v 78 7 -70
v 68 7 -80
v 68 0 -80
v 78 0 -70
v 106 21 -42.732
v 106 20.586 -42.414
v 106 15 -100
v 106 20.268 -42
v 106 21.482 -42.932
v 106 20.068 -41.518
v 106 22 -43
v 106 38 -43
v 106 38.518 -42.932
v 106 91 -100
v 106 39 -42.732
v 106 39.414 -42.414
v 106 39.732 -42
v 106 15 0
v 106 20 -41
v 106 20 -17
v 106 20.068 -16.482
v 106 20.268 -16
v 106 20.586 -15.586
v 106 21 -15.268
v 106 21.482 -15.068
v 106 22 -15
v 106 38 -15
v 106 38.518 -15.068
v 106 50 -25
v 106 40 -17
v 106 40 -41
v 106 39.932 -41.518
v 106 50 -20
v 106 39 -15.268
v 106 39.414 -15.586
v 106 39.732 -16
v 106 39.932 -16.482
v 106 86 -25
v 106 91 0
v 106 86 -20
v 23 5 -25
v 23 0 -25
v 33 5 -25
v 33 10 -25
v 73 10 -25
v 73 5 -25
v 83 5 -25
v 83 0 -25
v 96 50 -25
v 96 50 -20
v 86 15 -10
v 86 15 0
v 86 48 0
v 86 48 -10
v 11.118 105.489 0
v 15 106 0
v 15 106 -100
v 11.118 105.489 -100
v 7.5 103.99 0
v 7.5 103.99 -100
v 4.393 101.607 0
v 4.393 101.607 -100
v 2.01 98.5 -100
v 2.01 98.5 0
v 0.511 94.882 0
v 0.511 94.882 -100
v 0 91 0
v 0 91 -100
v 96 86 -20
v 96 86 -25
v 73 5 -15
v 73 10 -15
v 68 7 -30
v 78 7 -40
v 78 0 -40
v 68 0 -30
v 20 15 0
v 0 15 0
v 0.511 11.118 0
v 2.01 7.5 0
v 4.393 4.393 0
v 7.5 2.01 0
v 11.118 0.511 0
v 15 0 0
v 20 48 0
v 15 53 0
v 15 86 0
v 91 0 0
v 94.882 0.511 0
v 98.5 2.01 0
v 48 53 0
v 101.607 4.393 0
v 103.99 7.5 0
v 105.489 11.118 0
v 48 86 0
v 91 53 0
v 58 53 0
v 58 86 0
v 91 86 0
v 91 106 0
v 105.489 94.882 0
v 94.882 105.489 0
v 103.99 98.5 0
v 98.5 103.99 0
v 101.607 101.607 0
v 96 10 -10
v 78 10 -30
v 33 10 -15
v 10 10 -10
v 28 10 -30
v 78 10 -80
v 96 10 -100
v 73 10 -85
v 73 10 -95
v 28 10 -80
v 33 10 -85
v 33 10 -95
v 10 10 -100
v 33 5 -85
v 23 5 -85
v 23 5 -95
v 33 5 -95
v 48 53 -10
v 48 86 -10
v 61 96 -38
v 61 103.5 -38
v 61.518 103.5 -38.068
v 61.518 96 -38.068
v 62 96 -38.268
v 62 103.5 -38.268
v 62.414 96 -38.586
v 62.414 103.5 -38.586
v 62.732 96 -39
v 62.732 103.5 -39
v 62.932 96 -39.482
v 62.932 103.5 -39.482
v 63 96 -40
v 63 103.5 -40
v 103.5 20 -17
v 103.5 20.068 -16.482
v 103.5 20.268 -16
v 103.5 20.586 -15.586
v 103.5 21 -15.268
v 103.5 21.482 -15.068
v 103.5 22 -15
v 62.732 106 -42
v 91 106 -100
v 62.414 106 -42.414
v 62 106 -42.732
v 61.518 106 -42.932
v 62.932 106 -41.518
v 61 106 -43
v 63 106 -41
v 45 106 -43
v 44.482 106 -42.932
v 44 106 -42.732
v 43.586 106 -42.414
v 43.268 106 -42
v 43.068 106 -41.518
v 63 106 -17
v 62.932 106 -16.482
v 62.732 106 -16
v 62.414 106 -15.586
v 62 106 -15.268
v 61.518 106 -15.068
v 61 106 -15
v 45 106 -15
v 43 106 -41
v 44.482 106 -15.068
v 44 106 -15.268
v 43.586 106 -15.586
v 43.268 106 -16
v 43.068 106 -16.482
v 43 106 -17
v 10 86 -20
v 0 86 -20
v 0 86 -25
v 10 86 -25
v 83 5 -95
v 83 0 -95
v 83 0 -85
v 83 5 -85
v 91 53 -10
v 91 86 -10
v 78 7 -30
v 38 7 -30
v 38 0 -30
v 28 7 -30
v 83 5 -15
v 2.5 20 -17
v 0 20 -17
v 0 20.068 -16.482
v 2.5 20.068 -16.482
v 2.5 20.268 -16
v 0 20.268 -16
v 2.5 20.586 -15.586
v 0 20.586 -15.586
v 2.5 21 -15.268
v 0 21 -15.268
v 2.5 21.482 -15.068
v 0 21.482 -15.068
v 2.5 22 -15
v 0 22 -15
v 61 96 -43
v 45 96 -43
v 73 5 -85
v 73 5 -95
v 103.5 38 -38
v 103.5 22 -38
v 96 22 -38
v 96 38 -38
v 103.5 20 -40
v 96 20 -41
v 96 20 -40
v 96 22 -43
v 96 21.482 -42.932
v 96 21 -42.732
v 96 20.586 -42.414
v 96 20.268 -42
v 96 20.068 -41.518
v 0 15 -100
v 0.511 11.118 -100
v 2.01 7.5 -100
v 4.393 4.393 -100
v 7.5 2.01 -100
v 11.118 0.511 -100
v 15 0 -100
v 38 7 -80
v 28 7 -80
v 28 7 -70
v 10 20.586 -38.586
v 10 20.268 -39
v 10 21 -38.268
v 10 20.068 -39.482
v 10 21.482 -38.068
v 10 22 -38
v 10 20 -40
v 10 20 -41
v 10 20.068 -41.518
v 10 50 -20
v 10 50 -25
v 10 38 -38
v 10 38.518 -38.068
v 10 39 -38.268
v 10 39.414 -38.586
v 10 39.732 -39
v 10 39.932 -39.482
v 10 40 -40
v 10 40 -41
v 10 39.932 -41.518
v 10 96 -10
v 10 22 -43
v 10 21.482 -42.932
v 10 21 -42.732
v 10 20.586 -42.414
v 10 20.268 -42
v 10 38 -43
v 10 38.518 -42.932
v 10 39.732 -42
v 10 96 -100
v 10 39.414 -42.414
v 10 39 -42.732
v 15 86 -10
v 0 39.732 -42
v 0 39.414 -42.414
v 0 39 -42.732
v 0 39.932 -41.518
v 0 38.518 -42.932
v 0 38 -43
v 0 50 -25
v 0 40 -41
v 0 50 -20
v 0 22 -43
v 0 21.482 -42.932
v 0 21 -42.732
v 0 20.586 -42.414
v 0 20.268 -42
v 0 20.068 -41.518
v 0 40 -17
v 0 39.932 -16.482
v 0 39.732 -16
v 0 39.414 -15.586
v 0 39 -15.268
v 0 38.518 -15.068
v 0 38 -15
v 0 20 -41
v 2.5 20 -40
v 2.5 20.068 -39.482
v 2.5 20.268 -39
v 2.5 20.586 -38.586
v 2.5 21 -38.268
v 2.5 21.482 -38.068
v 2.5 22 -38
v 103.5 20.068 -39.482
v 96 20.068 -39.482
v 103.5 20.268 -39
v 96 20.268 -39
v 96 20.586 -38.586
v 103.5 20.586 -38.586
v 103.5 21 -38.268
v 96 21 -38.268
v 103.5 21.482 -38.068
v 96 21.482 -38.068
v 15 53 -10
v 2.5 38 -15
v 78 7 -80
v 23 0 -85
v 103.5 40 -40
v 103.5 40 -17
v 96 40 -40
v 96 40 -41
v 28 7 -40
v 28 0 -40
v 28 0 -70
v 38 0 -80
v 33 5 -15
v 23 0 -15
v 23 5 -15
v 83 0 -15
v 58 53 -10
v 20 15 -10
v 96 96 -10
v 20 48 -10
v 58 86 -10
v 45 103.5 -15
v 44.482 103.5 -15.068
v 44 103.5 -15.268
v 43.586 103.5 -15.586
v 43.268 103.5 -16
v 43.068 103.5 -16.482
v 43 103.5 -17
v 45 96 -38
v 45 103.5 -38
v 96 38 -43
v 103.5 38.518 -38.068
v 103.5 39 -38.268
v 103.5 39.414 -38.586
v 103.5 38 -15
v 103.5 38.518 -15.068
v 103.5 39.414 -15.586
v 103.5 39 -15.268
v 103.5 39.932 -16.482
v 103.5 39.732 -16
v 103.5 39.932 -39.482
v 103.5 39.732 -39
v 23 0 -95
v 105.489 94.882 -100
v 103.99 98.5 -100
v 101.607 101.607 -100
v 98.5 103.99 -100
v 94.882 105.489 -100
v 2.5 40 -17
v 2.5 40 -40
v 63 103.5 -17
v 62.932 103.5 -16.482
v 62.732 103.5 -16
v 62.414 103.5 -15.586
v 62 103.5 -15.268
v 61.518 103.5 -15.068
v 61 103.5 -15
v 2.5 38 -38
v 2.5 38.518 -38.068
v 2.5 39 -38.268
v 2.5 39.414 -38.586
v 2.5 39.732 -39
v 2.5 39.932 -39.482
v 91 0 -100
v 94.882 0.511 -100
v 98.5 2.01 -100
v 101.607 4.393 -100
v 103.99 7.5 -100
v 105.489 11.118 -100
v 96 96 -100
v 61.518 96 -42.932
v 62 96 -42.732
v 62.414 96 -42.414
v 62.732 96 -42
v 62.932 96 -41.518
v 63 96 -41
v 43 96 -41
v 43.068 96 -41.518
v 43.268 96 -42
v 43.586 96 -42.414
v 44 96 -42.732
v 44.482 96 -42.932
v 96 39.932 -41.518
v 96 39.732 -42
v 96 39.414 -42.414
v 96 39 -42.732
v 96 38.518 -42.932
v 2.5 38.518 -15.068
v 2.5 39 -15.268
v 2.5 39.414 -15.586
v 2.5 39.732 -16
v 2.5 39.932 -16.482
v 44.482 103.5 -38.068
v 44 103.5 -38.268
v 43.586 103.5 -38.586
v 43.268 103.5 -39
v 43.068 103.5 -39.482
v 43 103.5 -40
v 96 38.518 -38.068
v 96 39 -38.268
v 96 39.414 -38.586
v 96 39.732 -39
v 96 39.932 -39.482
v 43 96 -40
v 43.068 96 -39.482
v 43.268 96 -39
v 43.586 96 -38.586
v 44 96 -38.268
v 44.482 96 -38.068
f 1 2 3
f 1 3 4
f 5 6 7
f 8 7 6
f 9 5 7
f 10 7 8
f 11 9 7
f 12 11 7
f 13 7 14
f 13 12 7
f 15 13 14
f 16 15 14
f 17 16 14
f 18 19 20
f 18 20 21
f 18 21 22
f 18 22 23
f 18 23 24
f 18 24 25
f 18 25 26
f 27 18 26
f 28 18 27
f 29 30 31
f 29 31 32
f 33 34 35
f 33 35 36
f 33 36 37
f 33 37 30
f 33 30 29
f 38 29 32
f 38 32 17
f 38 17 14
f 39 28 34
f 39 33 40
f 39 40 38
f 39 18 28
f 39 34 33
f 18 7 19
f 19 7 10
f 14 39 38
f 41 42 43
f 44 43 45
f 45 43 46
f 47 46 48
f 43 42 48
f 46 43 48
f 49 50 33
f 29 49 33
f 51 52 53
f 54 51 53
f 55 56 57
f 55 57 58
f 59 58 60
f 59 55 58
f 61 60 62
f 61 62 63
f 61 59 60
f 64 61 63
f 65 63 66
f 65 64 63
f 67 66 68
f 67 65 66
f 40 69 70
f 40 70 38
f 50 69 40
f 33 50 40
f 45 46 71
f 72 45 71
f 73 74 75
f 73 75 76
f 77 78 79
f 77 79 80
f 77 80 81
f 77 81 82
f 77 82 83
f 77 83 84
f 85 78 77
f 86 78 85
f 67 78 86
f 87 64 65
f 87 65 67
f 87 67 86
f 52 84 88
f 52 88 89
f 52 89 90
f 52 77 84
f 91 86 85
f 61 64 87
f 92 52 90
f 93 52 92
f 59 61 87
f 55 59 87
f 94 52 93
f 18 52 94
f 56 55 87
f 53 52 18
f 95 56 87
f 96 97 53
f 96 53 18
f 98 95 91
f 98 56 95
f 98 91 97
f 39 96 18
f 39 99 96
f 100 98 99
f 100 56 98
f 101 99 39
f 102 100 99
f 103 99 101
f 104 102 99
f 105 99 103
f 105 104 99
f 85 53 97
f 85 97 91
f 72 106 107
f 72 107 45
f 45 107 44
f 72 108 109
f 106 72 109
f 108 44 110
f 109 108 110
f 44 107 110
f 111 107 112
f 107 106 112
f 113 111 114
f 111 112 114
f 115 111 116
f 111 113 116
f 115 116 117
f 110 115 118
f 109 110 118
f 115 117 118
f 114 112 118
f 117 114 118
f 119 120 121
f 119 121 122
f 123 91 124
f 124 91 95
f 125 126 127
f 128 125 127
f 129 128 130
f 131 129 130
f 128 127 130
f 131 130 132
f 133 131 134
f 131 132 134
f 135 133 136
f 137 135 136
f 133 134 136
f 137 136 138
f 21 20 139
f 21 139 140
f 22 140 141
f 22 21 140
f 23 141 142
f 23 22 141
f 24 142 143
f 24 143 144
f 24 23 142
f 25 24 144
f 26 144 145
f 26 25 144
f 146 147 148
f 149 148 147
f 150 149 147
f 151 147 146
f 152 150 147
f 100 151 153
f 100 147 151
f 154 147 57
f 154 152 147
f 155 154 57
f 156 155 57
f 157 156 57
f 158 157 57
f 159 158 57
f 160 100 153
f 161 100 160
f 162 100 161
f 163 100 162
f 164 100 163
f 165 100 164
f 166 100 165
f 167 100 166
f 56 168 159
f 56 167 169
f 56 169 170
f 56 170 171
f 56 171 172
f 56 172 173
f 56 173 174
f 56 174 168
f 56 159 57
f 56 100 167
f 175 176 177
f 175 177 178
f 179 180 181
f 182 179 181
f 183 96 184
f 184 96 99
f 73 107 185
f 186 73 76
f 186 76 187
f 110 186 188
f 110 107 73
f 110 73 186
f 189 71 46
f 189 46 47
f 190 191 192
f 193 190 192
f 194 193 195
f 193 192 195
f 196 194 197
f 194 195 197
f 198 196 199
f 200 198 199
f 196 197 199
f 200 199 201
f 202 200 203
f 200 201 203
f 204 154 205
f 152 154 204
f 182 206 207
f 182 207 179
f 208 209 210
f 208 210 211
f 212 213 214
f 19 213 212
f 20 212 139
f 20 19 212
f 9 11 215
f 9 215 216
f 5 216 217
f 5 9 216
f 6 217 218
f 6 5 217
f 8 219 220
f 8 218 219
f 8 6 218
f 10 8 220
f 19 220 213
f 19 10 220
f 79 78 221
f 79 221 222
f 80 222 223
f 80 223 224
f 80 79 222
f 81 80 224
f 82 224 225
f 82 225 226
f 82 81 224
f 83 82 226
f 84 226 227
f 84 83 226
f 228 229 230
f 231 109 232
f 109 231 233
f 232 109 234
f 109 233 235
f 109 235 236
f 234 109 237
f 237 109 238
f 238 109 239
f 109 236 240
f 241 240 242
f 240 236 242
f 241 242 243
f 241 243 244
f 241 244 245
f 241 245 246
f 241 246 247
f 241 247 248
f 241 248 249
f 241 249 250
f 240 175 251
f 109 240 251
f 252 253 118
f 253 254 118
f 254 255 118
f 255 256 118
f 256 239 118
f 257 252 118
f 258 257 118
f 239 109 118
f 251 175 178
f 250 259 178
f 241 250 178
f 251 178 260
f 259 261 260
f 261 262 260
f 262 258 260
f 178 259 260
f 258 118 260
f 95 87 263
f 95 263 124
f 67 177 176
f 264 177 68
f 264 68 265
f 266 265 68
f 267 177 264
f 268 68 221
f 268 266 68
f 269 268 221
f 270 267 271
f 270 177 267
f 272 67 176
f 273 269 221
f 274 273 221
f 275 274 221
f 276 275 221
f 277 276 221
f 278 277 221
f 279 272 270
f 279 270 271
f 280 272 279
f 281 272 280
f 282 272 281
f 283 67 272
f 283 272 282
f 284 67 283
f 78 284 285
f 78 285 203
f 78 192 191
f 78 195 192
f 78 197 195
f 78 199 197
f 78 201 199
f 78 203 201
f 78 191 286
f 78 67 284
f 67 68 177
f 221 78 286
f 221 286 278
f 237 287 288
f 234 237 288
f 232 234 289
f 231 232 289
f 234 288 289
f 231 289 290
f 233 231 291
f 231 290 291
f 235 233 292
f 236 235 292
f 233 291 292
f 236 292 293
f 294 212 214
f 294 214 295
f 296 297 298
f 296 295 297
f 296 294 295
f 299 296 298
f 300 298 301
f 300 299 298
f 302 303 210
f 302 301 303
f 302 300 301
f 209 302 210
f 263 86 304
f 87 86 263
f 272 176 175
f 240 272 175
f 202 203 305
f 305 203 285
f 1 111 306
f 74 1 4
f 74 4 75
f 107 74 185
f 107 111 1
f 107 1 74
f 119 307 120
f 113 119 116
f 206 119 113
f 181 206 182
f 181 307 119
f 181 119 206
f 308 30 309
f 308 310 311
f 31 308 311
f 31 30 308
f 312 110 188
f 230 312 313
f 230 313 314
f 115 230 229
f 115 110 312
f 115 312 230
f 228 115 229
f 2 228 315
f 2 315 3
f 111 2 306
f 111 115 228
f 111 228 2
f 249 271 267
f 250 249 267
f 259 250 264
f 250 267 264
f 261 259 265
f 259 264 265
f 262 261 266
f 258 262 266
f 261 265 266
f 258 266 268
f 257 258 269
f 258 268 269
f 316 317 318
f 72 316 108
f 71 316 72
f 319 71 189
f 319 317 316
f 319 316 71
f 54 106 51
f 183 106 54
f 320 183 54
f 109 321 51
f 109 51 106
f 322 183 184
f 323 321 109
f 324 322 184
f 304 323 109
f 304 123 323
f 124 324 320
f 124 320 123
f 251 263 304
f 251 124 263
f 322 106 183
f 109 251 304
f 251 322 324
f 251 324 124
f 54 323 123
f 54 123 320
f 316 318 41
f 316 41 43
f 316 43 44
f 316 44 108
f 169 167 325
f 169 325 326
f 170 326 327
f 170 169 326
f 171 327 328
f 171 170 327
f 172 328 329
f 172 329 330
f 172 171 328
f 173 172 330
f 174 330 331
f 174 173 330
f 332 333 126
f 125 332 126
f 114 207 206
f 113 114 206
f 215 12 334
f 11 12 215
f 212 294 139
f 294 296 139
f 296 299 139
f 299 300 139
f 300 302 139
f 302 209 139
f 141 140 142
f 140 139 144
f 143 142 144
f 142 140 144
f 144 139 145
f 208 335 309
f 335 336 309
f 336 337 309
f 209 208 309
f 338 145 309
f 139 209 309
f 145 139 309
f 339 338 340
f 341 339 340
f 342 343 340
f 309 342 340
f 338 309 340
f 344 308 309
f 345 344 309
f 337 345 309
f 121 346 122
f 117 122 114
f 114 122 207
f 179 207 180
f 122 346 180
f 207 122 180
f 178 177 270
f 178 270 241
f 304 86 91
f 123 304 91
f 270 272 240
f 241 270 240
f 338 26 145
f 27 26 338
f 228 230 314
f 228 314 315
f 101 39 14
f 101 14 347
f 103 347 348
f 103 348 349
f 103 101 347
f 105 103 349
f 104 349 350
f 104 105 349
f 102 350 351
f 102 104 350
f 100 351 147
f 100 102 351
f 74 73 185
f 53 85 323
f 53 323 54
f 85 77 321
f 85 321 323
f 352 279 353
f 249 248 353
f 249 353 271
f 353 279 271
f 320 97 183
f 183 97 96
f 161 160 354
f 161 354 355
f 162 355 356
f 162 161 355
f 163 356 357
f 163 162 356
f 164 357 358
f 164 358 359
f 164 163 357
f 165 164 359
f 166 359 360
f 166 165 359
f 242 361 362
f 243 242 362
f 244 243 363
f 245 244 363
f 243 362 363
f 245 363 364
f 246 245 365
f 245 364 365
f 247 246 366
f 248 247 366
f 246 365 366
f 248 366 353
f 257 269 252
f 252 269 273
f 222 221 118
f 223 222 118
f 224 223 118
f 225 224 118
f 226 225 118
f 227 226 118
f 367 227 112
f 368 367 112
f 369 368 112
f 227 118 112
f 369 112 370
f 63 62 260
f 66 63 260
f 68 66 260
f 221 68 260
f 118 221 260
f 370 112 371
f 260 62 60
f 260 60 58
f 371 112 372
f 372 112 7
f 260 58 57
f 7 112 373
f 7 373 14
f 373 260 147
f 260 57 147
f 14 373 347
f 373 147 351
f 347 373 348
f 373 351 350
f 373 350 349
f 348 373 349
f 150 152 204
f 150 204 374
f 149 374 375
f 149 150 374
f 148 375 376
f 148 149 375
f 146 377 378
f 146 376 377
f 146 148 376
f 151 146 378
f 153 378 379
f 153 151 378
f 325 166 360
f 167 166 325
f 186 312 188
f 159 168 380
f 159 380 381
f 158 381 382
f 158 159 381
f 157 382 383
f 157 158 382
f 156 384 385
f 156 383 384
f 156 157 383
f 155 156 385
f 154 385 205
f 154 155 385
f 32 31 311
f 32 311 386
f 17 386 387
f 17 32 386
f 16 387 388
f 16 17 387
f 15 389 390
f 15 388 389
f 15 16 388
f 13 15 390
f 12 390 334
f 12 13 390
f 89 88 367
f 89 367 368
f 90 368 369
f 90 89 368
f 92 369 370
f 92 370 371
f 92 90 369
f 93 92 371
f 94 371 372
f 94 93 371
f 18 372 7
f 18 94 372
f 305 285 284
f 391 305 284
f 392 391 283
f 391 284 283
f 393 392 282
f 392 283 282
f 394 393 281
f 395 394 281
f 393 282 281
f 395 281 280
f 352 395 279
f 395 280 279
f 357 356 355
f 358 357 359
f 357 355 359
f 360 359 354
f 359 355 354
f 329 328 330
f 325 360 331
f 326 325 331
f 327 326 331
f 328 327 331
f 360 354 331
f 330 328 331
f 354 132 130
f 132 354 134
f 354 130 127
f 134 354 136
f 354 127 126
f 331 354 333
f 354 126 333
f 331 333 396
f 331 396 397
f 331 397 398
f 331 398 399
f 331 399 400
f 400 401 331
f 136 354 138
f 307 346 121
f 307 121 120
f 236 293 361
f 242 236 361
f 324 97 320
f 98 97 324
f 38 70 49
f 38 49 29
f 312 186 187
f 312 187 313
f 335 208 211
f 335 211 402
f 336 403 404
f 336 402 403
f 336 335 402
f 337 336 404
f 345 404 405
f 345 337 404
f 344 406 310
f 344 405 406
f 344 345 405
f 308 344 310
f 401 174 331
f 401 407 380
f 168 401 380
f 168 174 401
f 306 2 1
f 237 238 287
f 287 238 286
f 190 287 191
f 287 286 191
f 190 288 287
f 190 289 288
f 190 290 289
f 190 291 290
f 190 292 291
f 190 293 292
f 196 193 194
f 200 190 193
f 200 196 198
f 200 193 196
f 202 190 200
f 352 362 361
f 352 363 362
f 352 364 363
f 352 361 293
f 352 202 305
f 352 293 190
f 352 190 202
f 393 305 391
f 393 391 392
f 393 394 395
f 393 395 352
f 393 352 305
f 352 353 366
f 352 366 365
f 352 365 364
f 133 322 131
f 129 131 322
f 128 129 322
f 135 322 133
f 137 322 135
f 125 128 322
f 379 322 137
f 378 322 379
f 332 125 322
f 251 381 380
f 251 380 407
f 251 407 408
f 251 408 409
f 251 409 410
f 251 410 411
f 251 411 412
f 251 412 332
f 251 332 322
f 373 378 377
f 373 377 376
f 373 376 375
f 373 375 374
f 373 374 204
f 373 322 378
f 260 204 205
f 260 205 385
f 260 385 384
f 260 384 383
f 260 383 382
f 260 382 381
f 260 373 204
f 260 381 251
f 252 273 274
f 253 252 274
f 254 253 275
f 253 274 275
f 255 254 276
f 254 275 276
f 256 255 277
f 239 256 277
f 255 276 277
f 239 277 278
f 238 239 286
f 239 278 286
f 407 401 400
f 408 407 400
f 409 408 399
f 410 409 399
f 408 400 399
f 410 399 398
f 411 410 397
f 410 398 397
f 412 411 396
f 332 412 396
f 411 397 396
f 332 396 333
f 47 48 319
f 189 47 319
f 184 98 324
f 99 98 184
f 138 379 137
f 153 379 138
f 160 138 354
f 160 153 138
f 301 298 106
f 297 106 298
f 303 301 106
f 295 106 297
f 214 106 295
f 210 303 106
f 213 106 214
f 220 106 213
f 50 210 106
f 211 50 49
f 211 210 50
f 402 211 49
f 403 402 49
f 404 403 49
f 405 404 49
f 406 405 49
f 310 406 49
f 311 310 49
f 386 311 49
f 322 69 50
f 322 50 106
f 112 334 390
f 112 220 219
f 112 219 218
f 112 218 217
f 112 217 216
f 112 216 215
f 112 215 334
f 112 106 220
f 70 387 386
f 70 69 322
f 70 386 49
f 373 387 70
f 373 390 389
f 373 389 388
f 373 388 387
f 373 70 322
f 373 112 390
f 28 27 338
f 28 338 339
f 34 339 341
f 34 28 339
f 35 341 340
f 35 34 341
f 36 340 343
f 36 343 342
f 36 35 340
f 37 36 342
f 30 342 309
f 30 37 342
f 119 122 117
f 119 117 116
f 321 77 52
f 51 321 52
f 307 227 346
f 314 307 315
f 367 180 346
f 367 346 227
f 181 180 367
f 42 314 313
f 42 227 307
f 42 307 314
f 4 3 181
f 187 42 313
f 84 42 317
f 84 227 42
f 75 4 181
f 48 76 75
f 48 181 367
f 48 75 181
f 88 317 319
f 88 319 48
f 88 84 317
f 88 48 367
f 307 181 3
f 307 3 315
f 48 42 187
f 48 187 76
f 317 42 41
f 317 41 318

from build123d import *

# Parameters (mm, degrees)
SKETCH1_W           = 66
SKETCH1_H           = 33
SKETCH1_W_2         = 33
BOSS_EXTRUDE1_DEPTH = 100
SKETCH3_W           = 86
SKETCH3_H           = 86
CUT_EXTRUDE1_DEPTH  = 90
CUT_EXTRUDE2_DEPTH  = 2.5
CUT_EXTRUDE3_DEPTH  = 18.5
SKETCH6_W           = 120.471409441
SKETCH6_H           = 36
CUT_EXTRUDE4_DEPTH  = 5
CUT_EXTRUDE5_DEPTH  = 2.5
CUT_EXTRUDE6_DEPTH  = 10
SKETCH9_W           = 60
SKETCH9_H           = 10
CUT_EXTRUDE7_DEPTH  = 5
SKETCH10_W          = 40
SKETCH10_H          = 10
CUT_EXTRUDE8_DEPTH  = 5
SKETCH11_W          = 50
SKETCH11_H          = 50
CUT_EXTRUDE11_DEPTH = 3
CUT_EXTRUDE12_DEPTH = 10


with BuildPart() as part:
    # Sketch1 → Boss-Extrude1 (new body)
    with BuildSketch(Plane.XY):
        with BuildLine():
            Line((15, 0), (91, 0))
            ThreePointArc((91, 0), (101.606601718, 4.393398282), (106, 15))
            Line((106, 15), (106, 91))
            ThreePointArc((106, 91), (101.606601718, 101.606601718), (91, 106))
            Line((91, 106), (15, 106))
            ThreePointArc((15, 106), (4.393398282, 101.606601718), (0, 91))
            Line((0, 91), (0, 15))
            ThreePointArc((0, 15), (4.393398282, 4.393398282), (15, 0))
        make_face()
        with Locations((53, 31.5)):
            Rectangle(SKETCH1_W, SKETCH1_H, mode=Mode.SUBTRACT)
        with Locations((31.5, 69.5)):
            Rectangle(SKETCH1_W_2, SKETCH1_H, mode=Mode.SUBTRACT)
        with Locations((74.5, 69.5)):
            Rectangle(SKETCH1_W_2, SKETCH1_H, mode=Mode.SUBTRACT)
    extrude(amount=-BOSS_EXTRUDE1_DEPTH)

    # Sketch3 → Cut-Extrude1 (cut)
    with BuildSketch(Plane(origin=(0, 0, -100), x_dir=(-1, 0, 0), z_dir=(0, 0, -1))):
        with Locations((-53, 53)):
            Rectangle(SKETCH3_W, SKETCH3_H)
    extrude(amount=-CUT_EXTRUDE1_DEPTH, mode=Mode.SUBTRACT)

    # Sketch4 → Cut-Extrude2 (cut)
    with BuildSketch(Plane(origin=(0, 106, 0), x_dir=(1, 0, 0), z_dir=(0, 1, 0))):
        with BuildLine():
            Line((45, 43), (61, 43))
            ThreePointArc((61, 43), (62.414213562, 42.414213562), (63, 41))
            Line((63, 41), (63, 17))
            ThreePointArc((63, 17), (62.414213562, 15.585786438), (61, 15))
            Line((61, 15), (45, 15))
            ThreePointArc((45, 15), (43.585786438, 15.585786438), (43, 17))
            Line((43, 17), (43, 41))
            ThreePointArc((43, 41), (43.585786438, 42.414213562), (45, 43))
        make_face()
    extrude(amount=-CUT_EXTRUDE2_DEPTH, mode=Mode.SUBTRACT)

    # Sketch5 → Cut-Extrude3 (cut)
    with BuildSketch(Plane(origin=(0, 103.5, 0), x_dir=(1, 0, 0), z_dir=(0, 1, 0))):
        with BuildLine():
            Line((45, 38), (61, 38))
            ThreePointArc((61, 38), (62.414213562, 38.585786438), (63, 40))
            Line((63, 40), (63, 41))
            ThreePointArc((63, 41), (62.414213562, 42.414213562), (61, 43))
            Line((61, 43), (45, 43))
            ThreePointArc((45, 43), (43.585786438, 42.414213562), (43, 41))
            Line((43, 41), (43, 40))
            ThreePointArc((43, 40), (43.585786438, 38.585786438), (45, 38))
        make_face()
    extrude(amount=-CUT_EXTRUDE3_DEPTH, mode=Mode.SUBTRACT)

    # Sketch6 → Cut-Extrude4 (cut)
    with BuildSketch(Plane.XY.offset(-20)):
        with Locations((51.490660341, 68)):
            Rectangle(SKETCH6_W, SKETCH6_H)
    extrude(amount=-CUT_EXTRUDE4_DEPTH, mode=Mode.SUBTRACT)

    # Sketch7 → Cut-Extrude5 (cut)
    with BuildSketch(Plane(origin=(106, 0, 0), x_dir=(0, 0, -1), z_dir=(1, 0, 0))):
        with BuildLine():
            Line((17, 40), (41, 40))
            ThreePointArc((41, 40), (42.414213562, 39.414213562), (43, 38))
            Line((43, 38), (43, 22))
            ThreePointArc((43, 22), (42.414213562, 20.585786438), (41, 20))
            Line((41, 20), (17, 20))
            ThreePointArc((17, 20), (15.585786438, 20.585786438), (15, 22))
            Line((15, 22), (15, 38))
            ThreePointArc((15, 38), (15.585786438, 39.414213562), (17, 40))
        make_face()
    cut_extrude5 = extrude(amount=-CUT_EXTRUDE5_DEPTH, mode=Mode.SUBTRACT)

    # Sketch8 → Cut-Extrude6 (cut)
    with BuildSketch(Plane(origin=(103.5, 0, 0), x_dir=(0, 0, -1), z_dir=(1, 0, 0))):
        with BuildLine():
            Line((40, 40), (41, 40))
            ThreePointArc((41, 40), (42.414213562, 39.414213562), (43, 38))
            Line((43, 38), (43, 22))
            ThreePointArc((43, 22), (42.414213562, 20.585786438), (41, 20))
            Line((41, 20), (40, 20))
            ThreePointArc((40, 20), (38.585786438, 20.585786438), (38, 22))
            Line((38, 22), (38, 38))
            ThreePointArc((38, 38), (38.585786438, 39.414213562), (40, 40))
        make_face()
    cut_extrude6 = extrude(amount=-CUT_EXTRUDE6_DEPTH, mode=Mode.SUBTRACT)

    # Mirror1: Cut-Extrude5, Cut-Extrude6 across plane
    add(cut_extrude5.mirror(Plane(origin=(53, 0, 0), x_dir=(0, 0, 1), z_dir=(1, 0, 0))), mode=Mode.SUBTRACT)
    add(cut_extrude6.mirror(Plane(origin=(53, 0, 0), x_dir=(0, 0, 1), z_dir=(1, 0, 0))), mode=Mode.SUBTRACT)

    # Sketch9 → Cut-Extrude7 (cut)
    with BuildSketch(Plane.XZ):
        with Locations((53, -20)):
            Rectangle(SKETCH9_W, SKETCH9_H)
        with Locations((53, -90)):
            Rectangle(SKETCH9_W, SKETCH9_H)
    extrude(amount=-CUT_EXTRUDE7_DEPTH, mode=Mode.SUBTRACT)

    # Sketch10 → Cut-Extrude8 (cut)
    with BuildSketch(Plane.XZ.offset(-5)):
        with Locations((53, -20)):
            Rectangle(SKETCH10_W, SKETCH10_H)
        with Locations((53, -90)):
            Rectangle(SKETCH10_W, SKETCH10_H)
    extrude(amount=-CUT_EXTRUDE8_DEPTH, mode=Mode.SUBTRACT)

    # Sketch11 → Cut-Extrude11 (cut)
    with BuildSketch(Plane(origin=(0, 10, 0), x_dir=(1, 0, 0), z_dir=(0, 1, 0))):
        with Locations((53, 55)):
            Rectangle(SKETCH11_W, SKETCH11_H)
    extrude(amount=-CUT_EXTRUDE11_DEPTH, mode=Mode.SUBTRACT)

    # Sketch12 → Cut-Extrude12 (cut)
    with BuildSketch(Plane(origin=(0, 7, 0), x_dir=(1, 0, 0), z_dir=(0, 1, 0))):
        Polygon((38, 80), (68, 80), (78, 70.00000089), (78, 40.00000089), (68, 30), (38, 30), (28, 39.99999911), (28, 69.99999911), align=None)
    extrude(amount=-CUT_EXTRUDE12_DEPTH, mode=Mode.SUBTRACT)


solid = part.part
